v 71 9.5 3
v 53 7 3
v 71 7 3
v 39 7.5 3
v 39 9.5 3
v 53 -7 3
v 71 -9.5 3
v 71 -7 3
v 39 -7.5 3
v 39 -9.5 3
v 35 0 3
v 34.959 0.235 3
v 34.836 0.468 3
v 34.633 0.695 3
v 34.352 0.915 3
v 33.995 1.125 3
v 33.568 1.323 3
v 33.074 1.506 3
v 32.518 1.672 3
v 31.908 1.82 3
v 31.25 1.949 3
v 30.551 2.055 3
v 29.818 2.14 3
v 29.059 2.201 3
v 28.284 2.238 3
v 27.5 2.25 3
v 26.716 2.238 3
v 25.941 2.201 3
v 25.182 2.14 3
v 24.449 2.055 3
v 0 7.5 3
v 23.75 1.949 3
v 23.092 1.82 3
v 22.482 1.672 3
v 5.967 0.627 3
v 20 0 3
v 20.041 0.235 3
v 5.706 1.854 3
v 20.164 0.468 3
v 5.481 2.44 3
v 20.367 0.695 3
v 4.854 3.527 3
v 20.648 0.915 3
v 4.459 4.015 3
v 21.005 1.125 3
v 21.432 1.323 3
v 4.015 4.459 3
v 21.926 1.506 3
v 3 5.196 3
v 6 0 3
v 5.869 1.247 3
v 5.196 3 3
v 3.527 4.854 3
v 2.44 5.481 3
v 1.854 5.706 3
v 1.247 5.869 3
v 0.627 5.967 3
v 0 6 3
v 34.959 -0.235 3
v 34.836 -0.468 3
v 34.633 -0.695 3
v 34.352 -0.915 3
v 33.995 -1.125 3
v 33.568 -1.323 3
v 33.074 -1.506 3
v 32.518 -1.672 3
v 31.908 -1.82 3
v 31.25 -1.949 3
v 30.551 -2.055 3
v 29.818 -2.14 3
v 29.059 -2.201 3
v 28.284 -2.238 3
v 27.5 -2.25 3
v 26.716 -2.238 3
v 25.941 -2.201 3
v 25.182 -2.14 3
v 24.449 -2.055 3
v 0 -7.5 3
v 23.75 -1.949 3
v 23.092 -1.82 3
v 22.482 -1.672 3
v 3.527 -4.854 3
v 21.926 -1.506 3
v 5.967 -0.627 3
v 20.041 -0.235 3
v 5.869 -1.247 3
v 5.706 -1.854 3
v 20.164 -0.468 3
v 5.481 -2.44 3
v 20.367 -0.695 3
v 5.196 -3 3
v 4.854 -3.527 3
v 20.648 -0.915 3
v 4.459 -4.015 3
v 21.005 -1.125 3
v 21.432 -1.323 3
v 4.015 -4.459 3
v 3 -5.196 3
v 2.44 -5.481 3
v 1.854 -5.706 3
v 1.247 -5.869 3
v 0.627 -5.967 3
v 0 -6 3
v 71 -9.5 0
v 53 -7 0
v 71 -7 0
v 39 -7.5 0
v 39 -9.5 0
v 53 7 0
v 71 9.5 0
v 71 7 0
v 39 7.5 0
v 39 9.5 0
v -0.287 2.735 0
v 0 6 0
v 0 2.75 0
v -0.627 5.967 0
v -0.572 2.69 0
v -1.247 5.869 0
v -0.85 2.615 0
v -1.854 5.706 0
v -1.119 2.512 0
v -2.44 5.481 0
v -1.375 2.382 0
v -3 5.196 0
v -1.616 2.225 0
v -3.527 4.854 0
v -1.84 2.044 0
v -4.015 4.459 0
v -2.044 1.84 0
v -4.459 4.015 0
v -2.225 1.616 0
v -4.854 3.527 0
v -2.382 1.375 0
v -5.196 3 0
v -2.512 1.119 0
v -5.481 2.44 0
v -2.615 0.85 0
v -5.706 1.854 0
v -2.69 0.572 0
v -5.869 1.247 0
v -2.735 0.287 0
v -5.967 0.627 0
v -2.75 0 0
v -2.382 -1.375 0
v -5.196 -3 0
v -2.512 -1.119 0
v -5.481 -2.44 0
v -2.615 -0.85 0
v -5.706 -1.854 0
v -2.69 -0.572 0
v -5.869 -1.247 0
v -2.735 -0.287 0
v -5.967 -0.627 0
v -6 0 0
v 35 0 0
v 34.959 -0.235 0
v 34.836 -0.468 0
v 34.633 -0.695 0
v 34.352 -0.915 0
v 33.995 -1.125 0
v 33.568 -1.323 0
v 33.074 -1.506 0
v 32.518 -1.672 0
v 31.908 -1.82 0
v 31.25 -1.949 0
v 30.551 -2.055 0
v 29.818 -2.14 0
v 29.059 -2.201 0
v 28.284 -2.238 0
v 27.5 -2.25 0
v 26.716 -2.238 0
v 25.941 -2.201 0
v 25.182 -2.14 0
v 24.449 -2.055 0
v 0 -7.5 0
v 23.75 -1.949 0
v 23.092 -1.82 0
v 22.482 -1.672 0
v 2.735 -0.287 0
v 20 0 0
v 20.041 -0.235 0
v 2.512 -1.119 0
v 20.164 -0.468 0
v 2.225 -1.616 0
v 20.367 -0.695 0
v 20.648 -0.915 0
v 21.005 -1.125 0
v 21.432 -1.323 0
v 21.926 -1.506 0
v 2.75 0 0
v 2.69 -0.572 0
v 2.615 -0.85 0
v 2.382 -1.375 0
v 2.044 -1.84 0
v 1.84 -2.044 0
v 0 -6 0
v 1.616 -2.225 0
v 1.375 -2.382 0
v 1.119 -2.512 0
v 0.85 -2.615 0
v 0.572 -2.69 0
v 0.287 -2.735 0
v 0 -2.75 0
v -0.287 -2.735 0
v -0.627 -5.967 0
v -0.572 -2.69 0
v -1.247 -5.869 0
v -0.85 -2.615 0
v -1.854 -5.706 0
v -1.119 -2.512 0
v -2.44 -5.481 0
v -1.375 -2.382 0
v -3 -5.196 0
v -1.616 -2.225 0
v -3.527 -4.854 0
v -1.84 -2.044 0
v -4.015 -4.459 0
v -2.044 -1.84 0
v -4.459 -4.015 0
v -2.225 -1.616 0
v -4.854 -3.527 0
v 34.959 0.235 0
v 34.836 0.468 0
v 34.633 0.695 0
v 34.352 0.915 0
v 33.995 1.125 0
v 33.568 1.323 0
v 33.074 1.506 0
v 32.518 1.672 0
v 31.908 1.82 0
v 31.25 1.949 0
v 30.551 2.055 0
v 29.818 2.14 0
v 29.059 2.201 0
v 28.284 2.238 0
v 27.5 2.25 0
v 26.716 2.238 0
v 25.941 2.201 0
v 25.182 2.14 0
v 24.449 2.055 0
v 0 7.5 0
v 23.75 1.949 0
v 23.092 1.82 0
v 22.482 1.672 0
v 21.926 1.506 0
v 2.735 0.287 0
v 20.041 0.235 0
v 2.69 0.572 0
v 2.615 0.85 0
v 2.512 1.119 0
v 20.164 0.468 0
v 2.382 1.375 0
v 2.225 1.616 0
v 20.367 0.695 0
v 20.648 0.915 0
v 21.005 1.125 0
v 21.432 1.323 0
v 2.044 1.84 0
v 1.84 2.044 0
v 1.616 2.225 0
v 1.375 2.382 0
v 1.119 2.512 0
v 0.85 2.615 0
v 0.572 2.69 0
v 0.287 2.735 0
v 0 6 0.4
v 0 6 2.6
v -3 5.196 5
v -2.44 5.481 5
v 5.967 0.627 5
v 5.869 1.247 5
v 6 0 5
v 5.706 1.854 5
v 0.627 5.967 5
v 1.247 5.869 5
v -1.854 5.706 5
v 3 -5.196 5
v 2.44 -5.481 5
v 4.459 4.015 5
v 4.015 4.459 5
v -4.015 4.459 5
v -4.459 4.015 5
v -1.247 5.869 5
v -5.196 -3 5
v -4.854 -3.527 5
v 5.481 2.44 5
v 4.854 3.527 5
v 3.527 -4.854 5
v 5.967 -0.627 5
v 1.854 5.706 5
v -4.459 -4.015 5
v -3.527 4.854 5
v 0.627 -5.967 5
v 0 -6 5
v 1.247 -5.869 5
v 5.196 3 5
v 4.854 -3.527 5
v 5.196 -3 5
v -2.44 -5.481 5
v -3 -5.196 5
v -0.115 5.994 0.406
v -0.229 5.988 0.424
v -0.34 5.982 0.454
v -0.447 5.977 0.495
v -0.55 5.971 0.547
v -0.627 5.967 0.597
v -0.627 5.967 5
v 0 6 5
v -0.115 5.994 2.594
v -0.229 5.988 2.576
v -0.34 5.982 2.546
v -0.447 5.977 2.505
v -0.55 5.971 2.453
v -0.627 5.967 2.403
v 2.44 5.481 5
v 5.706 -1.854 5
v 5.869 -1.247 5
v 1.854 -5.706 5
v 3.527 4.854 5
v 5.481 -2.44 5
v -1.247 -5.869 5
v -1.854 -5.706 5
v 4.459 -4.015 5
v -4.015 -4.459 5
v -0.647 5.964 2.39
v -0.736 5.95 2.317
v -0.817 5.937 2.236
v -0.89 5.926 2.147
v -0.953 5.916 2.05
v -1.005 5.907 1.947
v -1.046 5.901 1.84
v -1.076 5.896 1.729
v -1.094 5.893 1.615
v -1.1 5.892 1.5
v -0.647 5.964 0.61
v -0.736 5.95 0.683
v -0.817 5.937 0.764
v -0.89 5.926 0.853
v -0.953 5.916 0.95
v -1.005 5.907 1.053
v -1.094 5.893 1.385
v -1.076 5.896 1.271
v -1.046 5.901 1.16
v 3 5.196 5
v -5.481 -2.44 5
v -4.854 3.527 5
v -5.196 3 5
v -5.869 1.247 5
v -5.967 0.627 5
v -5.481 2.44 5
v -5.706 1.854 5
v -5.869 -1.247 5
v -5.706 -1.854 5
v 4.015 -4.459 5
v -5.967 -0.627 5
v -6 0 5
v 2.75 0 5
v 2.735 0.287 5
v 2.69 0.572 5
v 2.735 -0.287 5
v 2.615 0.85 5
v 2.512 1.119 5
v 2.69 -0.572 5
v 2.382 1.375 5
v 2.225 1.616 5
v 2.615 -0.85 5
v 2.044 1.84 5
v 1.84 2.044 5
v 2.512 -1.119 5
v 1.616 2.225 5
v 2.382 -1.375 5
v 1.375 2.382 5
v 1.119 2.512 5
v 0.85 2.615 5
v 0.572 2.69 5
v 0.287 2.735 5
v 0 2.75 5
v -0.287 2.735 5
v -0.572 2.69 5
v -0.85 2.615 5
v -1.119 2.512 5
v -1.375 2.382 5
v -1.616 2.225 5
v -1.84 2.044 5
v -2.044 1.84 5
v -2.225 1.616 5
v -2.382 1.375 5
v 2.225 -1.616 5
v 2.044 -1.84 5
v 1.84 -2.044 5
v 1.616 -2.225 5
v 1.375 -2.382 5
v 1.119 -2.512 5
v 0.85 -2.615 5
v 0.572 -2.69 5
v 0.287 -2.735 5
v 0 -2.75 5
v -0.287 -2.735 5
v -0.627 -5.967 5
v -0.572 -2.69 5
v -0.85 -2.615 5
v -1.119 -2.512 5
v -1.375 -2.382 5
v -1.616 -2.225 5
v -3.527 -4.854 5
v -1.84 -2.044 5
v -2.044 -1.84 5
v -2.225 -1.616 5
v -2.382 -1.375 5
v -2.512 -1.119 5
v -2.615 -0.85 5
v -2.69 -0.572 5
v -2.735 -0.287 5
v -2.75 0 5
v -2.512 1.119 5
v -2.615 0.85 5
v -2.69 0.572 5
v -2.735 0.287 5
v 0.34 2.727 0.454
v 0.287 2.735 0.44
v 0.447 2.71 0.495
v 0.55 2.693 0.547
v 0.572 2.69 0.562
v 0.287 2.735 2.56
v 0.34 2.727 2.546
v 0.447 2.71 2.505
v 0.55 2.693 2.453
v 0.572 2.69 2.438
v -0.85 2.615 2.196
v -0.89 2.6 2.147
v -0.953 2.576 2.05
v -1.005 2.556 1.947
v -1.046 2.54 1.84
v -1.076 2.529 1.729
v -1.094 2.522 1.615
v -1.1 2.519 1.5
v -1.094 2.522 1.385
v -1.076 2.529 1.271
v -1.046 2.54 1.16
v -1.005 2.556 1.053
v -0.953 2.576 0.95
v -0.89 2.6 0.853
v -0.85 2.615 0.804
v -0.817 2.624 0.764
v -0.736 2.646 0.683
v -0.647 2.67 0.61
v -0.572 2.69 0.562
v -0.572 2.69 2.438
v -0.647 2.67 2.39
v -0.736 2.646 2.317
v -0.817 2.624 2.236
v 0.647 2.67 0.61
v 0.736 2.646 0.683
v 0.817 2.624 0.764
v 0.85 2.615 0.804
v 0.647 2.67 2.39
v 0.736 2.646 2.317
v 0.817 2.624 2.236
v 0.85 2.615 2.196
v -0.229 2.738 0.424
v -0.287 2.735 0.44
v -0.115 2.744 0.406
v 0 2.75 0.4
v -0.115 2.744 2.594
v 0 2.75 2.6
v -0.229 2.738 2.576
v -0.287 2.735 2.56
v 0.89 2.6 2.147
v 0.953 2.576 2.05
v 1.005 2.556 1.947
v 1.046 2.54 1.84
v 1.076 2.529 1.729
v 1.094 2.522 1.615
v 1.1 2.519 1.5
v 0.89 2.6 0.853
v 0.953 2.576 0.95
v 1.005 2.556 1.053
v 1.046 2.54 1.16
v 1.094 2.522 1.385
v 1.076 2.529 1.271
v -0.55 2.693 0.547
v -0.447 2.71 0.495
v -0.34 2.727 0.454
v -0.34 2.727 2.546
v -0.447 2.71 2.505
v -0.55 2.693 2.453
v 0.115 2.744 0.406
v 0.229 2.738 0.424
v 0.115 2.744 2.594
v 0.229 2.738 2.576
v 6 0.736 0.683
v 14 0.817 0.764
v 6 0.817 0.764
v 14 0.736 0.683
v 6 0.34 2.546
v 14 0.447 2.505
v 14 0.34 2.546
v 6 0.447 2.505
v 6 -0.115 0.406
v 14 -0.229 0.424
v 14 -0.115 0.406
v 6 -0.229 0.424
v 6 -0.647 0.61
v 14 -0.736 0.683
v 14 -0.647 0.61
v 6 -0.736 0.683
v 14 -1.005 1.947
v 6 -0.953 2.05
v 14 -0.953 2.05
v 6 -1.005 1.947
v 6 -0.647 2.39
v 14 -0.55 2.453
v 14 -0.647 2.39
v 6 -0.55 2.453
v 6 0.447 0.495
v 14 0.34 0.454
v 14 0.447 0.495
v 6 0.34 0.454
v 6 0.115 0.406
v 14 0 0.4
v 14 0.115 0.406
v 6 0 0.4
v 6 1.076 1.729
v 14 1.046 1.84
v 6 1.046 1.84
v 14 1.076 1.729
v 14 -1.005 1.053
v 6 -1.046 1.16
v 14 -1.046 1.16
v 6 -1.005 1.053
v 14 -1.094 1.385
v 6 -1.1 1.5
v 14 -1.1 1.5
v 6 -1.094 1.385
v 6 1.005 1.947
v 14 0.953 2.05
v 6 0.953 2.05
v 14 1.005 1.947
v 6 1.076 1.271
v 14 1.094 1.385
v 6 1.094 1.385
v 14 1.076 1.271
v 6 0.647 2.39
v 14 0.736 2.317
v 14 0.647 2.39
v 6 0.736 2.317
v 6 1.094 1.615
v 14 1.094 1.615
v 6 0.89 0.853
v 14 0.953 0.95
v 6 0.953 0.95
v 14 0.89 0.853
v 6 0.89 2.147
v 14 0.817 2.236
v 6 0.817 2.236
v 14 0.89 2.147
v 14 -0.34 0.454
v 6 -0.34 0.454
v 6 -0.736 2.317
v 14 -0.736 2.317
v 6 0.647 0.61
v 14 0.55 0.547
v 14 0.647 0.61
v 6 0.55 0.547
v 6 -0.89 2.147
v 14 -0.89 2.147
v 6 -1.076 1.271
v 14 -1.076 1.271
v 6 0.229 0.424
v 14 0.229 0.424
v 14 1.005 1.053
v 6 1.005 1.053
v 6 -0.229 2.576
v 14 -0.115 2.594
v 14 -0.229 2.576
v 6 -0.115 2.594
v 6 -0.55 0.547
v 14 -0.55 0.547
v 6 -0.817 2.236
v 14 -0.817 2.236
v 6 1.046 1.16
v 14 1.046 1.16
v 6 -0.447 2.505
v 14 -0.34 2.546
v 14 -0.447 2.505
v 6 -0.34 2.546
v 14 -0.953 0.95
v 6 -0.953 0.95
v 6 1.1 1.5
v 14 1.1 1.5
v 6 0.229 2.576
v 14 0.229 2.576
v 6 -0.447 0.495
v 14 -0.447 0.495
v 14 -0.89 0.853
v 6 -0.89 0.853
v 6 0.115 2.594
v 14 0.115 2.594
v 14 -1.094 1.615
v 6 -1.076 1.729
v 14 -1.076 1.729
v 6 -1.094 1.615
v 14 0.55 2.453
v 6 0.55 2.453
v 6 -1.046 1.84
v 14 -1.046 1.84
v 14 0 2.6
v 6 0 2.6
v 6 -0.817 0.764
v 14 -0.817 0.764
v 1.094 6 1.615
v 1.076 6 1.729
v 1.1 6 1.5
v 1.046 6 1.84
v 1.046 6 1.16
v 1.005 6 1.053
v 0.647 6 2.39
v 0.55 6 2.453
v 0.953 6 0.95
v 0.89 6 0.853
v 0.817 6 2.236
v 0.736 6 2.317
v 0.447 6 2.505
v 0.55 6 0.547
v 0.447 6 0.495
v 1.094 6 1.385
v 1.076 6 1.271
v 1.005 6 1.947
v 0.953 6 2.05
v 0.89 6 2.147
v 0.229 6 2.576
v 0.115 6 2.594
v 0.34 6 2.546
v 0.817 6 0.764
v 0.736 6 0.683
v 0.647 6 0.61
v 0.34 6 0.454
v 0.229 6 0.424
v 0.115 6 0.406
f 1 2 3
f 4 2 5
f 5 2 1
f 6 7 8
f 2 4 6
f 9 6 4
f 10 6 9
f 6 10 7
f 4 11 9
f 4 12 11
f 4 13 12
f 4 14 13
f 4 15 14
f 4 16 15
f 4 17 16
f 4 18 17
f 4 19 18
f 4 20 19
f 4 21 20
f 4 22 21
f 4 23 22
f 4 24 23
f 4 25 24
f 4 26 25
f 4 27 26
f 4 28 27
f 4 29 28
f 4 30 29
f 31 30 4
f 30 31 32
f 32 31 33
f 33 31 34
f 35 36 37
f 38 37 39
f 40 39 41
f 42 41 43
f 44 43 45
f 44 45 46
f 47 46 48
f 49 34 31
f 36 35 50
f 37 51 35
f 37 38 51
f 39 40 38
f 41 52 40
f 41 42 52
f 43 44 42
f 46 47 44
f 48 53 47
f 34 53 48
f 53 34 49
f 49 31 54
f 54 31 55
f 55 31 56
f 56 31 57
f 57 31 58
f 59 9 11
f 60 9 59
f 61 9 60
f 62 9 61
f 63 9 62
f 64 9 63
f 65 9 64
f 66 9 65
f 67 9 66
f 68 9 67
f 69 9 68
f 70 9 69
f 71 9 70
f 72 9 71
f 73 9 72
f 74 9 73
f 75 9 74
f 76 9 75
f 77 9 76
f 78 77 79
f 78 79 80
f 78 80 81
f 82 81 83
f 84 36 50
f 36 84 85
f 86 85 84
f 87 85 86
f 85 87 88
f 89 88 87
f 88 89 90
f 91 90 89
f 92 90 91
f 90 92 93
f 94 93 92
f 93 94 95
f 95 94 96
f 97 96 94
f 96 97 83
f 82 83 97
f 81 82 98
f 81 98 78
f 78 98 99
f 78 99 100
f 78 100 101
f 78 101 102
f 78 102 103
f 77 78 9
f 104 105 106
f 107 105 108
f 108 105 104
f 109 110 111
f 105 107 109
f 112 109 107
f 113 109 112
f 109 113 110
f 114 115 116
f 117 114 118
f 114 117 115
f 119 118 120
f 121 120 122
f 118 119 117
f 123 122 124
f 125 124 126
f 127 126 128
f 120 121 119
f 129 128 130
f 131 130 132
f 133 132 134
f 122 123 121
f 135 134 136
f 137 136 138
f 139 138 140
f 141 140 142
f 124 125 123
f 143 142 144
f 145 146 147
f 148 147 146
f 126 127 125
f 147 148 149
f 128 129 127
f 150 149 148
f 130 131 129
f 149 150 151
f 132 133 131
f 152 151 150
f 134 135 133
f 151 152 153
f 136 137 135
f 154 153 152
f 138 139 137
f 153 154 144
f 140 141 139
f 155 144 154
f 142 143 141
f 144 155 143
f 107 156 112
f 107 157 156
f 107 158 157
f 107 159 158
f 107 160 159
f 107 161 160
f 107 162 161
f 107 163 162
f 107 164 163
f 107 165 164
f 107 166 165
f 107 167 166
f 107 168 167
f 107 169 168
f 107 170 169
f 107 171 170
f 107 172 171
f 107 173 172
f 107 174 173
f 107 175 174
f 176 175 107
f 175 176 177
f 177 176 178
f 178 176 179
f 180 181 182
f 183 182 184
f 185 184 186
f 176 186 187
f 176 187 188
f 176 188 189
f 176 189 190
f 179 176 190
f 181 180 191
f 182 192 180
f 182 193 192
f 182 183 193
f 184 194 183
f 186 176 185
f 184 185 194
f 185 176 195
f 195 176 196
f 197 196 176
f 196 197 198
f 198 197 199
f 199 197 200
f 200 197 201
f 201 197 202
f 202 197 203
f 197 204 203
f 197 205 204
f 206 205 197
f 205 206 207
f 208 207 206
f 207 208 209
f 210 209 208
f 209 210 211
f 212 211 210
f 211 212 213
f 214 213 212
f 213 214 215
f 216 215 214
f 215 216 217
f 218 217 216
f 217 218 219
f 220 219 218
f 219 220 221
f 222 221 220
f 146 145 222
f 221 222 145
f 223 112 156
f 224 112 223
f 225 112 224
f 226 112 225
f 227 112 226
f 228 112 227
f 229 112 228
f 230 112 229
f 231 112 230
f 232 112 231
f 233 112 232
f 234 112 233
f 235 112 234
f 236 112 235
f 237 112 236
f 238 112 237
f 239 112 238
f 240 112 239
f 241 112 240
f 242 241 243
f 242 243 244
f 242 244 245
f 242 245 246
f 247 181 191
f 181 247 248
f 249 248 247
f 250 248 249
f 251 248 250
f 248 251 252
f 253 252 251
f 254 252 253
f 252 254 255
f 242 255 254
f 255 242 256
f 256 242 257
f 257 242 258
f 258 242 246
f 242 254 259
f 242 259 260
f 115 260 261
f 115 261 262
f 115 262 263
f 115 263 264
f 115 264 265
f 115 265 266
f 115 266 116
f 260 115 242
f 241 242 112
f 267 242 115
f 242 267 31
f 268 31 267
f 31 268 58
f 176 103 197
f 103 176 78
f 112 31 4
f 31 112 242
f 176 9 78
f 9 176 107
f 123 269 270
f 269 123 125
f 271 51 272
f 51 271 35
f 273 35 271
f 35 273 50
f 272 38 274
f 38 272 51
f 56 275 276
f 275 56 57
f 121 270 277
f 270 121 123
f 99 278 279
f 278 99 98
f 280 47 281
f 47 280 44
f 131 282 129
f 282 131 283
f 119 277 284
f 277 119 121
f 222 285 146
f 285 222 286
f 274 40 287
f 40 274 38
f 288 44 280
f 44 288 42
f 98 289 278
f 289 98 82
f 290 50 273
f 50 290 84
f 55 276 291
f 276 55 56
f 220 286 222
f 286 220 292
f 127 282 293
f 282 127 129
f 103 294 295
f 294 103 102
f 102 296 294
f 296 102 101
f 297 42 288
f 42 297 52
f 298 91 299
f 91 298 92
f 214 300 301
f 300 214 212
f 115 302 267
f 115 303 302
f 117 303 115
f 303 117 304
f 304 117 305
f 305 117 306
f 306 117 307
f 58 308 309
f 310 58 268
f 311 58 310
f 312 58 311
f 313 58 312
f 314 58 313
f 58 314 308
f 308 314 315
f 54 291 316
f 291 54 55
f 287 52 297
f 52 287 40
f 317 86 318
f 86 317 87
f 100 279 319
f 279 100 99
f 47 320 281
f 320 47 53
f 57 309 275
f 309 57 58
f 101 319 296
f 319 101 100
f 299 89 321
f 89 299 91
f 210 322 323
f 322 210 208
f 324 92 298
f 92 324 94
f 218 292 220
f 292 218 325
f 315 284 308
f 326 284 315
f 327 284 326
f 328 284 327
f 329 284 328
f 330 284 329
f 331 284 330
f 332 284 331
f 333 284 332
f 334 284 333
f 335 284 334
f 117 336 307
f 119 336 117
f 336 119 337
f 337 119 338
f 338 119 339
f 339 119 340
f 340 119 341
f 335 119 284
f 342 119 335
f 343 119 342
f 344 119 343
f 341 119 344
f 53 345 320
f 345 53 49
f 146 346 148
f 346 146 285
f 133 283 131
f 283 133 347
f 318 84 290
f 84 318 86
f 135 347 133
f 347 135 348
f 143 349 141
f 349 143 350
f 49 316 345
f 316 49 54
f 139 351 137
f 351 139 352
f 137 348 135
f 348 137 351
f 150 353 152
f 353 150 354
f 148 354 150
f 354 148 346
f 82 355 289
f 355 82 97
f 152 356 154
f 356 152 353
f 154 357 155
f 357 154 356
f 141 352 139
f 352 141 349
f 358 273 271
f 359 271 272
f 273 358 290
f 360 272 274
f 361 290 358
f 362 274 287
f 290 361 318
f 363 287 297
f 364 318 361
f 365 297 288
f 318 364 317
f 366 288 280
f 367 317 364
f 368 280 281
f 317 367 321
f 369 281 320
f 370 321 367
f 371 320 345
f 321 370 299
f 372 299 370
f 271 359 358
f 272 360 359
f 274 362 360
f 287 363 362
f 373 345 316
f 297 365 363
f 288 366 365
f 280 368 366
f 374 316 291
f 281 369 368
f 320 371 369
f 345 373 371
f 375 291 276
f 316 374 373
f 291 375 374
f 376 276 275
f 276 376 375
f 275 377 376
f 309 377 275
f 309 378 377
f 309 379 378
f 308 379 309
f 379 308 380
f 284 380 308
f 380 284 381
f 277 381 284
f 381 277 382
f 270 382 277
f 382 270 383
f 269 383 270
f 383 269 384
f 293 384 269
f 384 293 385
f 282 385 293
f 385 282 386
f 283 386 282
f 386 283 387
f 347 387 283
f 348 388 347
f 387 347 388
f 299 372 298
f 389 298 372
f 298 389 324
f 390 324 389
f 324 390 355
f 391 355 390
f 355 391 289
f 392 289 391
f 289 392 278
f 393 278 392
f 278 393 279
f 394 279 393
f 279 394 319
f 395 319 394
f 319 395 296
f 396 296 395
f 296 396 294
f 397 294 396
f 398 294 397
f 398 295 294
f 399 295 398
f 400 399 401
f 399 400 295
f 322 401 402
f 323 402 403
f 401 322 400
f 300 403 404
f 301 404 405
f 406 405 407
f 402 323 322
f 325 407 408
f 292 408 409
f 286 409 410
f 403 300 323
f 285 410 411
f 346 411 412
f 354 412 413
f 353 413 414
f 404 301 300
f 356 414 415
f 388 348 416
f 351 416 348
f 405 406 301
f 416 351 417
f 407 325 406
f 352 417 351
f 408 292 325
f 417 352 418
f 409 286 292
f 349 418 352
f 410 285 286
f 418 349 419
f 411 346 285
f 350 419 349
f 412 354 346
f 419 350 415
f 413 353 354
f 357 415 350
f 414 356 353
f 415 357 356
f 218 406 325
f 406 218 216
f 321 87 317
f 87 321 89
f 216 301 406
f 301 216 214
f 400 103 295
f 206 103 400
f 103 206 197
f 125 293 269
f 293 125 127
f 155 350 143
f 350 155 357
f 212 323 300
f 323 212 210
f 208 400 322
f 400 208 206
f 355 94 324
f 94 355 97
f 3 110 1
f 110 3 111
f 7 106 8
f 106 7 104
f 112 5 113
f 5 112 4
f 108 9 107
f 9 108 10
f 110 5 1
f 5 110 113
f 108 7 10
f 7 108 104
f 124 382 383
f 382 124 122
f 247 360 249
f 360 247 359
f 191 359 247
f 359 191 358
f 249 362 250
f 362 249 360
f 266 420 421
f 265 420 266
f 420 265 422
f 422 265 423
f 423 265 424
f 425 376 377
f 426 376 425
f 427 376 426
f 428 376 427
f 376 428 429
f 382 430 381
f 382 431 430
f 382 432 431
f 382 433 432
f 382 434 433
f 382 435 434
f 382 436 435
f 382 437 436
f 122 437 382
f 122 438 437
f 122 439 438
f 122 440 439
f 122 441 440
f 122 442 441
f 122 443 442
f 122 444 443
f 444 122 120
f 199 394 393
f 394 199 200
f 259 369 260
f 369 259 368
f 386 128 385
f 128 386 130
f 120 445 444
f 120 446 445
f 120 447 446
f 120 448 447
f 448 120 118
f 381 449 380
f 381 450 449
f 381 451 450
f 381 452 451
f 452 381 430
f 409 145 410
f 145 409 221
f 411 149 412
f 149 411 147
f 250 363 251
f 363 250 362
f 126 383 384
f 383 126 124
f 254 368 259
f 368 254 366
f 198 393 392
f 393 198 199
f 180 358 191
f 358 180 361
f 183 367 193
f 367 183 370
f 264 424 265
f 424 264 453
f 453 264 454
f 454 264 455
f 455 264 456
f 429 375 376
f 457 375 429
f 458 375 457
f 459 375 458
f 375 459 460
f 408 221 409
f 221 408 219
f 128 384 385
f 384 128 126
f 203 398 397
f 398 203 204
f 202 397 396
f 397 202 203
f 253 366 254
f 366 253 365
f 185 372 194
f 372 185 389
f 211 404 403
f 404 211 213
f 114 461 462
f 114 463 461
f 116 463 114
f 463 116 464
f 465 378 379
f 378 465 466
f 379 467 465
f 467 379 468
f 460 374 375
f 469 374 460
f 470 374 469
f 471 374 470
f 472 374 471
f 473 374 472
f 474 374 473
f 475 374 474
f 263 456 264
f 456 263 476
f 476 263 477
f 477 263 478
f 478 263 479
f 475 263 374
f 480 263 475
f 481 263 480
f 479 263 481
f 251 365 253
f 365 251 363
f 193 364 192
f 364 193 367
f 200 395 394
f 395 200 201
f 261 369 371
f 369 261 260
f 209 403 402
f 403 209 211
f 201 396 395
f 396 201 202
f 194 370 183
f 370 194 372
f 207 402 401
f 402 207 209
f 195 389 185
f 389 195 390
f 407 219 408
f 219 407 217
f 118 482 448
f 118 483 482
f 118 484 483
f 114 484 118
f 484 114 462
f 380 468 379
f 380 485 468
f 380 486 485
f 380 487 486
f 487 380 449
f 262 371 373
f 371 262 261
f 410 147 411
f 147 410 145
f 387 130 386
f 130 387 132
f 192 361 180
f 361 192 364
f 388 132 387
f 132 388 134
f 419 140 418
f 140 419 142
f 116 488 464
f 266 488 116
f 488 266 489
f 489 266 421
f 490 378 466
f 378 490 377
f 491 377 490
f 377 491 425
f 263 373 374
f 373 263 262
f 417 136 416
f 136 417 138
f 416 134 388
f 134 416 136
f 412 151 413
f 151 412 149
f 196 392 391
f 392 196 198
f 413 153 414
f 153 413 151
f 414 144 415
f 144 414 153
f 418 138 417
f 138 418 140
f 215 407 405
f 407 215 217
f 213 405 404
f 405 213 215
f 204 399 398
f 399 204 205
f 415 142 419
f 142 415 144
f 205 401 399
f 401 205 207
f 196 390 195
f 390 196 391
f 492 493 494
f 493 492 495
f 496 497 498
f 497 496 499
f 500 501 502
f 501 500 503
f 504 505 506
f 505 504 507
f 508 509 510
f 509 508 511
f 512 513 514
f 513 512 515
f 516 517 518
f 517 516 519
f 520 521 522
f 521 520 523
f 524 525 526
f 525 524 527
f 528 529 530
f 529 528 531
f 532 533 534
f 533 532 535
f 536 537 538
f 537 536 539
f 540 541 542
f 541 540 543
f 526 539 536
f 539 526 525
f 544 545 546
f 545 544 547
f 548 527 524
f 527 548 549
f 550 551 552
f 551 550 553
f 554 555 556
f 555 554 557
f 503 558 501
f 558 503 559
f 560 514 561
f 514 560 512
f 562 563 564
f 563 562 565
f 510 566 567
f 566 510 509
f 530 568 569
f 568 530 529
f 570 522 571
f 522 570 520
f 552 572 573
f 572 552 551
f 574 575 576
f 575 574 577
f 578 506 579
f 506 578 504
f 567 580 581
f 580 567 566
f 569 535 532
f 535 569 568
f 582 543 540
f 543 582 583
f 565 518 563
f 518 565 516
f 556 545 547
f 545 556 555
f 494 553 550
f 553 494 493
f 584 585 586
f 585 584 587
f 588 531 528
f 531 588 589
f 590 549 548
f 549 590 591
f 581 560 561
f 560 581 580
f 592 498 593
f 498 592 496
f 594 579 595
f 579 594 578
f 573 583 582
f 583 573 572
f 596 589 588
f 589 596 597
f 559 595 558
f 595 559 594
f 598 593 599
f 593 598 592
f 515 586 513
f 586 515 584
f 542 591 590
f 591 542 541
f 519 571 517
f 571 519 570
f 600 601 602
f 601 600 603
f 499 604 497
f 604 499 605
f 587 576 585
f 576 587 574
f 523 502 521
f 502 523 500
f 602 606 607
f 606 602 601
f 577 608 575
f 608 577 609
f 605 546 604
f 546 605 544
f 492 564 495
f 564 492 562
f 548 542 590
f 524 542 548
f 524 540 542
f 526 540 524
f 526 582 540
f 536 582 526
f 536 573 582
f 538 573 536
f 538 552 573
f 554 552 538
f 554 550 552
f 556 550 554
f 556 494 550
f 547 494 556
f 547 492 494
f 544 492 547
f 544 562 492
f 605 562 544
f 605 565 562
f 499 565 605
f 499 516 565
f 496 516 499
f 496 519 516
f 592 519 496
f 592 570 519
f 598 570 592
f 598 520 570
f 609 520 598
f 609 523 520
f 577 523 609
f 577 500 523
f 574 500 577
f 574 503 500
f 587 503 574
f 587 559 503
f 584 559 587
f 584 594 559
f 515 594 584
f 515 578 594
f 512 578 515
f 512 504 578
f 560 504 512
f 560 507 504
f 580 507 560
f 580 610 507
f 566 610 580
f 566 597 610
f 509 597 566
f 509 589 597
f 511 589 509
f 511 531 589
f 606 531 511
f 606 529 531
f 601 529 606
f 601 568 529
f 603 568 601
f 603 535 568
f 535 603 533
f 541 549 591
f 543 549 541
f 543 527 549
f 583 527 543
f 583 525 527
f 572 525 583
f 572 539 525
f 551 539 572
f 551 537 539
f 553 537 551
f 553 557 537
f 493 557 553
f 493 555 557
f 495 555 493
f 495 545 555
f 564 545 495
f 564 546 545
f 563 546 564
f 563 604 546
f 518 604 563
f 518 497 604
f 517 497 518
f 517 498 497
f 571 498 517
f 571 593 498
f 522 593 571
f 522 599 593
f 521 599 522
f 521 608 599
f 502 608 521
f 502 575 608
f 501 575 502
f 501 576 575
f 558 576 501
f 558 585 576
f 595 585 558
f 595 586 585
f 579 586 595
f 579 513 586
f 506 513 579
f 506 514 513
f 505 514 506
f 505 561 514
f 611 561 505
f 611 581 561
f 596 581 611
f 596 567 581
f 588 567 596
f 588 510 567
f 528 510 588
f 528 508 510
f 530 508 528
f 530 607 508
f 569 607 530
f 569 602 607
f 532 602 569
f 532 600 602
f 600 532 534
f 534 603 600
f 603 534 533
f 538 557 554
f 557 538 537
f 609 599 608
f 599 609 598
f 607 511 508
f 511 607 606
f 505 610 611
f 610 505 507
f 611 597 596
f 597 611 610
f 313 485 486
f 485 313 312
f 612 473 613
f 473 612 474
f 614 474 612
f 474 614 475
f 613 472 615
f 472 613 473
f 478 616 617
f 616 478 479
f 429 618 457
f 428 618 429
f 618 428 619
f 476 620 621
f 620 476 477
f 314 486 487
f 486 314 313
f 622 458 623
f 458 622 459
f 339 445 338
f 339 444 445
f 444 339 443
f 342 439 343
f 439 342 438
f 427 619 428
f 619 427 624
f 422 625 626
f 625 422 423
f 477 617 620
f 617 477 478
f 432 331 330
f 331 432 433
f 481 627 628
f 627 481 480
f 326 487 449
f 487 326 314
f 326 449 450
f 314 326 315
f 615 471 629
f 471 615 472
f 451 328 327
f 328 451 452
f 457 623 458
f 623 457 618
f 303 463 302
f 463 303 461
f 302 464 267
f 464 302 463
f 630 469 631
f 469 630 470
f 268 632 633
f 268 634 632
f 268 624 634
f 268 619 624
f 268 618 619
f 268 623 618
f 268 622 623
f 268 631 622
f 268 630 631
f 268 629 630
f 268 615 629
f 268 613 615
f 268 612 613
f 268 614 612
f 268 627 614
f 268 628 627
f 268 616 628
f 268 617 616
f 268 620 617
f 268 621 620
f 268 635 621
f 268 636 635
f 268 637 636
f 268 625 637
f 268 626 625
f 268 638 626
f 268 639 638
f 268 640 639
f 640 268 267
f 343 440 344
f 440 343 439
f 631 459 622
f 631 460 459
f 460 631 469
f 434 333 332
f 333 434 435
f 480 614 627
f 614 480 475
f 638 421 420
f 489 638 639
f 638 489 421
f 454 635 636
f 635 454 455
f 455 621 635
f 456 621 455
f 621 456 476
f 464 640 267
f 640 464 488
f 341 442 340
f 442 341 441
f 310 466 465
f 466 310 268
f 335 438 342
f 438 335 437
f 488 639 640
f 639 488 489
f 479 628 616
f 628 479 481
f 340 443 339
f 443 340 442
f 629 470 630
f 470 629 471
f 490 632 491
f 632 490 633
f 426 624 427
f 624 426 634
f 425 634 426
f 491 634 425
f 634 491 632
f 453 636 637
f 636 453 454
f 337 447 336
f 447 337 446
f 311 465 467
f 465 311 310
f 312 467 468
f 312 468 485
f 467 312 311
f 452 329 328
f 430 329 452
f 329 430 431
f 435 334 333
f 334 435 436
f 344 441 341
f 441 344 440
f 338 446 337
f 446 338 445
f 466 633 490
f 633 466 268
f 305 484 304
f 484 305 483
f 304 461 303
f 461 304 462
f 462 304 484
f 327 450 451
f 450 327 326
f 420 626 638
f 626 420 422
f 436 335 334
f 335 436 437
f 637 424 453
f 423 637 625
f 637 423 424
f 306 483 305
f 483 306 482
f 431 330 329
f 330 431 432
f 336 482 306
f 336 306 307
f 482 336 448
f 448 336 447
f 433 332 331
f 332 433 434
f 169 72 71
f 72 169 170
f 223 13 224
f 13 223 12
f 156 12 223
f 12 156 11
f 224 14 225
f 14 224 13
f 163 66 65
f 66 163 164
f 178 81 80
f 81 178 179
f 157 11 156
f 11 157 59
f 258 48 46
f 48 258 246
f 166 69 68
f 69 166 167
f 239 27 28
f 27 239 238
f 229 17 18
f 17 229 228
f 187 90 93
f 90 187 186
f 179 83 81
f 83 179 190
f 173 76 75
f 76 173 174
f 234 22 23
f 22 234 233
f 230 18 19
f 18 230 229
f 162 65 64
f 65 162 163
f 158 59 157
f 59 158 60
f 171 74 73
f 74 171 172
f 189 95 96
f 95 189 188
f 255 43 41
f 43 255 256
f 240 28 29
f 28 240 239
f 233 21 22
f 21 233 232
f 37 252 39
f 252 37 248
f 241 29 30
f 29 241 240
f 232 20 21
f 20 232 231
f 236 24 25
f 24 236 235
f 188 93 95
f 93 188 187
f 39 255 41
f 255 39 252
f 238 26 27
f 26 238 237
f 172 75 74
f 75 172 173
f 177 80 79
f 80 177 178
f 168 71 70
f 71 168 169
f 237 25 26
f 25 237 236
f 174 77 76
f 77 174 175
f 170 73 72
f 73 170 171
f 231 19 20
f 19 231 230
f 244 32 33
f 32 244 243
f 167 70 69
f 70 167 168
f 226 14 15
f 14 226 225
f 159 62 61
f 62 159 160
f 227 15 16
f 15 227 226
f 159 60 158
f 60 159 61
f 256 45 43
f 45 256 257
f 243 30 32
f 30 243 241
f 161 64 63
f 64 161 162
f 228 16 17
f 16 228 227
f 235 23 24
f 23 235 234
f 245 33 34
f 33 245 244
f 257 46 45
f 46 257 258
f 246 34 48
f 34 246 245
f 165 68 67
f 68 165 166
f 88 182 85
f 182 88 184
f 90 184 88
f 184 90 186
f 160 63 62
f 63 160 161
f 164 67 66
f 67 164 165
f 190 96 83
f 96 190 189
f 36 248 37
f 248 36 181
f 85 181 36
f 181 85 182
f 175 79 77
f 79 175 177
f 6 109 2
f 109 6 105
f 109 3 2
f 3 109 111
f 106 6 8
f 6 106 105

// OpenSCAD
// ============================================================================
// P4_Upper_Arm_Link
// ============================================================================
// SeaBreeze-Inspector 3DOF 机械臂 — 3D打印零件
// 参数与代码完全吻合: L1=55, L2=45, L3=35, base_height=25
// 生成日期: 2026
// ============================================================================

$fn = 60;

L1 = 55;
L2 = 45;
L3 = 35;
BASE_H = 25;

// SG90 舵机参数 (mm)
SG90_BODY_W = 22.2;
SG90_BODY_H = 11.8;
SG90_BODY_L = 31.0;
SG90_AXIS_H = 26.5;
SG90_AXIS_D = 4.8;
SG90_EAR_HOLE_D = 2.0;
SG90_EAR_SPAN_X = 10.0;
SG90_EAR_SPAN_Y = 22.5;

// 紧固件
M2_D = 2.2;
M2p5_D = 2.7;
M3_D = 3.2;

// 打印参数
WALL = 2.0;
LINK_W = 15.0;
LINK_T = 3.0;


ARM_L = L1; ARM_W = LINK_W; ARM_T = LINK_T;
AXIS_HOLE_D = 5.5; SET_SCREW_D = M2_D;
FORK_W = 14; FORK_D = 32; FORK_WALL = WALL;

module upper_arm_link() {
    difference() {
        union() {
            translate([ARM_L/2, 0, ARM_T/2])
                cube([ARM_L, ARM_W, ARM_T], center=true);
            cylinder(h=ARM_T + 2, d=12);
            translate([ARM_L, 0, ARM_T/2])
                cube([FORK_D, ARM_W + 4, ARM_T], center=true);
        }
        translate([0, 0, -1])
            cylinder(h=ARM_T+4, d=AXIS_HOLE_D);
        translate([6, 0, ARM_T/2])
            rotate([0, 90, 0]) cylinder(h=8, d=SET_SCREW_D);
        translate([0, 6, ARM_T/2])
            rotate([90, 0, 0]) cylinder(h=8, d=SET_SCREW_D);
        translate([ARM_L/2, 0, -1])
            scale([2, 0.6, 1])
            cylinder(h=ARM_T+2, d=ARM_W * 0.5);
        translate([ARM_L + FORK_D/2 - FORK_WALL, 0, ARM_T/2])
            cube([FORK_D, FORK_W, ARM_T+2], center=true);
        for(side=[-1,1]) for(hole=[-1,1])
            translate([ARM_L + 8, side*FORK_W/2, SG90_AXIS_H - ARM_T/2])
            rotate([90, 0, 0])
            cylinder(h=FORK_WALL+2, d=M2_D);
    }
}
upper_arm_link();
